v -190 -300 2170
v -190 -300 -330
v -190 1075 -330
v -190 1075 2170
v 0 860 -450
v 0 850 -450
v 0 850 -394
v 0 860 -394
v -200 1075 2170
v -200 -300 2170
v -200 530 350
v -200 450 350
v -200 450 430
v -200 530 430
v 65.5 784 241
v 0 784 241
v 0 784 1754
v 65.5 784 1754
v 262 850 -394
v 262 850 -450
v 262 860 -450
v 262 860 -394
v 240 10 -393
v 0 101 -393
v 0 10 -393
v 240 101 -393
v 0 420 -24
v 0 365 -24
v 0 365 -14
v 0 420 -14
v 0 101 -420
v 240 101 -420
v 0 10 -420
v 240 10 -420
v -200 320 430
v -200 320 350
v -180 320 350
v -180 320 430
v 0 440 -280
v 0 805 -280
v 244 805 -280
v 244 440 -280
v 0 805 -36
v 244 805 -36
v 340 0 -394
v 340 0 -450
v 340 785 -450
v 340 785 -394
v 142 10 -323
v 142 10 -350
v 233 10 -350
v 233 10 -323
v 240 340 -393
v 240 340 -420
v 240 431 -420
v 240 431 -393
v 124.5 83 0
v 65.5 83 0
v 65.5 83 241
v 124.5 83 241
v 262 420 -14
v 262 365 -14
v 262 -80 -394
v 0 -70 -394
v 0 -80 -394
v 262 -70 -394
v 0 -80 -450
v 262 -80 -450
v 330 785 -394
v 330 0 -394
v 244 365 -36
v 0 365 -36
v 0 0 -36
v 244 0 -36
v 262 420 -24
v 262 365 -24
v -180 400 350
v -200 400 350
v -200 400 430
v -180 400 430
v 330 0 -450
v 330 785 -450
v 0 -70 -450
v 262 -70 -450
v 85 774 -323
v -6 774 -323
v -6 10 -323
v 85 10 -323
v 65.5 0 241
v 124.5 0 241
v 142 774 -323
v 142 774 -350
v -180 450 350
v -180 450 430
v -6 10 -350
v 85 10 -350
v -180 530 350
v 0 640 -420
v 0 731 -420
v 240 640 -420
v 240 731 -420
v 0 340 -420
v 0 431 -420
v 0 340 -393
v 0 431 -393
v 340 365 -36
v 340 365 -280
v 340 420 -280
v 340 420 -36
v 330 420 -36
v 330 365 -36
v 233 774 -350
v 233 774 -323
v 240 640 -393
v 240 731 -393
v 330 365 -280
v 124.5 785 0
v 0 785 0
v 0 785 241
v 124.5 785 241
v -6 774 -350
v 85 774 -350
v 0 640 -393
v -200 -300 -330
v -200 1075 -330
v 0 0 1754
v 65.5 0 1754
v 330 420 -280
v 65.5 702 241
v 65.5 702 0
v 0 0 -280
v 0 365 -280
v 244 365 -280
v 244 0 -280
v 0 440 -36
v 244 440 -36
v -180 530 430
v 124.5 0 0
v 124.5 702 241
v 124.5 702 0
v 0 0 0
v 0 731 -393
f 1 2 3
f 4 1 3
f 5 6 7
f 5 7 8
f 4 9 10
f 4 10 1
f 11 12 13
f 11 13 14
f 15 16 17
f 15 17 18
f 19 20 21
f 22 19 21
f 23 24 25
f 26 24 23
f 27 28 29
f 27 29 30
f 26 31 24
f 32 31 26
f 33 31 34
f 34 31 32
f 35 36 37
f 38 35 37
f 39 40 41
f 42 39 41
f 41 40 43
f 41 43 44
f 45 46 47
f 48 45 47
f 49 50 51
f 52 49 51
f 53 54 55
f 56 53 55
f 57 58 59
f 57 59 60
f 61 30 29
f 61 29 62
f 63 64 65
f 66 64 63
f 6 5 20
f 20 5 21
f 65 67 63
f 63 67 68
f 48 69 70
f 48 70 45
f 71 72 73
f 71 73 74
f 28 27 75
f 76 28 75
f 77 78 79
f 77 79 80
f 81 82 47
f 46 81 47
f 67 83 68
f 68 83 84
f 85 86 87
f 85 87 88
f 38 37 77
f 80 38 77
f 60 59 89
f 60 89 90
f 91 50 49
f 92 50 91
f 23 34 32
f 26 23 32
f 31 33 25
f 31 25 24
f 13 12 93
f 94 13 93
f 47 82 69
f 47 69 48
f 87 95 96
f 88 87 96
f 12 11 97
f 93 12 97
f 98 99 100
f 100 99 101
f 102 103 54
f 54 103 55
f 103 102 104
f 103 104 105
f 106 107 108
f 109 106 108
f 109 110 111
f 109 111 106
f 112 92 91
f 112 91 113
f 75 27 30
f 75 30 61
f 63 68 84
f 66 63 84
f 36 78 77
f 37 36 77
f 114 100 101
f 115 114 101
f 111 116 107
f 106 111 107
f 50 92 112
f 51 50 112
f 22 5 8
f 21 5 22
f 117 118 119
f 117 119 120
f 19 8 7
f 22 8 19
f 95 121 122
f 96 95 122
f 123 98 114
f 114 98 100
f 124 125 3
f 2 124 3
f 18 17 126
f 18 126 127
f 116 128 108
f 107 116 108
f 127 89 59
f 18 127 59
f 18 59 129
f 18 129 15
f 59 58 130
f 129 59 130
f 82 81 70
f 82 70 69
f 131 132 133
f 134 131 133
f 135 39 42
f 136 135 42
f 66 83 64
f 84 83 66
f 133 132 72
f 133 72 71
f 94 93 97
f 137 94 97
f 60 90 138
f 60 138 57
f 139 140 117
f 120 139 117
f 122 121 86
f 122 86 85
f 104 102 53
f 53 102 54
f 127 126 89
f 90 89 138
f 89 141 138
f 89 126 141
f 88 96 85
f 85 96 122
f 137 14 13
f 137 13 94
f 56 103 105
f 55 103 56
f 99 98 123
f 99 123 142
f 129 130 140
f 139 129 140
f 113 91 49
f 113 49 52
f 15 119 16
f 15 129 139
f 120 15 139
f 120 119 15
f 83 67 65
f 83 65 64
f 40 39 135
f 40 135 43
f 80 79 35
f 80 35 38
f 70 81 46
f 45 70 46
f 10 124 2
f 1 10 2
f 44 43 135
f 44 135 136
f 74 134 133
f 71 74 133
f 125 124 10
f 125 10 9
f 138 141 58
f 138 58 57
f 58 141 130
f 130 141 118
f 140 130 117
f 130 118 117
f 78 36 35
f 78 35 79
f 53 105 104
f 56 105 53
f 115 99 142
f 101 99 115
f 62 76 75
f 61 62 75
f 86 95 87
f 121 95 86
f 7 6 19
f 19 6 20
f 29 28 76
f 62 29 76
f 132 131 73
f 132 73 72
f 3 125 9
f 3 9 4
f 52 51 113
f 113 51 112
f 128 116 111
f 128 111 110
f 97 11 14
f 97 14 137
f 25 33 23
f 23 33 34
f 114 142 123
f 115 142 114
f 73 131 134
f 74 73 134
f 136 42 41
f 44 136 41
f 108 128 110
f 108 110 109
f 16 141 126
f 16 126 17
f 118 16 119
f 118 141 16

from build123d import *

# Parameters (mm, degrees)
BOX002_W     = 124.5
BOX002_H     = 83
BOX002_DEPTH = 241
BOX_W        = 124.5
BOX_H        = 83
BOX_DEPTH    = 241
BOX003_W     = 65.5
BOX003_H     = 619
BOX003_DEPTH = 241
BOX001_W     = 65.5
BOX001_H     = 784
BOX001_DEPTH = 1513
BOX004_W     = 91
BOX004_H     = 764
BOX004_DEPTH = 27
BOX005_W     = 91
BOX005_H     = 764
BOX005_DEPTH = 27
BOX006_W     = 244
BOX006_H     = 365
BOX006_DEPTH = 244
BOX007_W     = 240
BOX007_H     = 91
BOX007_DEPTH = 27
BOX008_W     = 240
BOX008_H     = 91
BOX008_DEPTH = 27
BOX009_W     = 240
BOX009_H     = 91
BOX009_DEPTH = 27
BOX010_W     = 244
BOX010_H     = 365
BOX010_DEPTH = 244
BOX011_W     = 10
BOX011_H     = 1375
BOX011_DEPTH = 2500
BOX012_W     = 20
BOX012_H     = 80
BOX012_DEPTH = 80
BOX013_W     = 20
BOX013_H     = 80
BOX013_DEPTH = 80
BOX014_W     = 262
BOX014_H     = 10
BOX014_DEPTH = 56
BOX015_W     = 262
BOX015_H     = 10
BOX015_DEPTH = 56
BOX016_W     = 10
BOX016_H     = 785
BOX016_DEPTH = 56
BOX018_W     = 10
BOX018_H     = 55
BOX018_DEPTH = 244
BOX019_W     = 262
BOX019_H     = 55
BOX019_DEPTH = 10


with BuildPart() as sockelrechts:
    # Box002 → Box002 (new body)
    with BuildSketch(Plane(origin=(0, 702, 0), x_dir=(1, 0, 0), z_dir=(0, 0, 1))):
        with Locations((62.25, 41.5)):
            Rectangle(BOX002_W, BOX002_H)
    extrude(amount=BOX002_DEPTH)


with BuildPart() as sockellinks:
    # Box → Box (new body)
    with BuildSketch(Plane.XY):
        with Locations((62.25, 41.5)):
            Rectangle(BOX_W, BOX_H)
    extrude(amount=BOX_DEPTH)


with BuildPart() as spiegelflaechezwischensockel:
    # Box003 → Box003 (new body)
    with BuildSketch(Plane(origin=(0, 83, 0), x_dir=(1, 0, 0), z_dir=(0, 0, 1))):
        with Locations((32.75, 309.5)):
            Rectangle(BOX003_W, BOX003_H)
    extrude(amount=BOX003_DEPTH)


with BuildPart() as spiegelbody:
    # Box001 → Box001 (new body)
    with BuildSketch(Plane.XY.offset(241)):
        with Locations((32.75, 392)):
            Rectangle(BOX001_W, BOX001_H)
    extrude(amount=BOX001_DEPTH)

    # Connect: union SpiegelFlaecheZwischenSockel
    add(spiegelflaechezwischensockel.part)

    # Connect001: union SockelRechts, SockelLinks
    add(sockelrechts.part)
    add(sockellinks.part)


with BuildPart() as bodenkonstrleiste1:
    # Box004 → Box004 (new body)
    with BuildSketch(Plane(origin=(142, 10, -350), x_dir=(1, 0, 0), z_dir=(0, 0, 1))):
        with Locations((45.5, 382)):
            Rectangle(BOX004_W, BOX004_H)
    extrude(amount=BOX004_DEPTH)


with BuildPart() as bodenkonstrleiste002:
    # Box005 → Box005 (new body)
    with BuildSketch(Plane(origin=(-6, 10, -350), x_dir=(1, 0, 0), z_dir=(0, 0, 1))):
        with Locations((45.5, 382)):
            Rectangle(BOX005_W, BOX005_H)
    extrude(amount=BOX005_DEPTH)


with BuildPart() as ohp_left:
    # Box006 → Box006 (new body)
    with BuildSketch(Plane.XY.offset(-280)):
        with Locations((122, 182.5)):
            Rectangle(BOX006_W, BOX006_H)
    extrude(amount=BOX006_DEPTH)


with BuildPart() as box007:
    # Box007 → Box007 (new body)
    with BuildSketch(Plane(origin=(0, 10, -420), x_dir=(1, 0, 0), z_dir=(0, 0, 1))):
        with Locations((120, 45.5)):
            Rectangle(BOX007_W, BOX007_H)
    extrude(amount=BOX007_DEPTH)


with BuildPart() as box008:
    # Box008 → Box008 (new body)
    with BuildSketch(Plane(origin=(0, 340, -420), x_dir=(1, 0, 0), z_dir=(0, 0, 1))):
        with Locations((120, 45.5)):
            Rectangle(BOX008_W, BOX008_H)
    extrude(amount=BOX008_DEPTH)


with BuildPart() as box009:
    # Box009 → Box009 (new body)
    with BuildSketch(Plane(origin=(0, 640, -420), x_dir=(1, 0, 0), z_dir=(0, 0, 1))):
        with Locations((120, 45.5)):
            Rectangle(BOX009_W, BOX009_H)
    extrude(amount=BOX009_DEPTH)


with BuildPart() as ohp_right:
    # Box010 → Box010 (new body)
    with BuildSketch(Plane(origin=(0, 440, -280), x_dir=(1, 0, 0), z_dir=(0, 0, 1))):
        with Locations((122, 182.5)):
            Rectangle(BOX010_W, BOX010_H)
    extrude(amount=BOX010_DEPTH)


with BuildPart() as wand:
    # Box011 → Box011 (new body)
    with BuildSketch(Plane(origin=(-200, -300, -330), x_dir=(1, 0, 0), z_dir=(0, 0, 1))):
        with Locations((5, 687.5)):
            Rectangle(BOX011_W, BOX011_H)
    extrude(amount=BOX011_DEPTH)


with BuildPart() as steckdose1:
    # Box012 → Box012 (new body)
    with BuildSketch(Plane(origin=(-200, 320, 350), x_dir=(1, 0, 0), z_dir=(0, 0, 1))):
        with Locations((10, 40)):
            Rectangle(BOX012_W, BOX012_H)
    extrude(amount=BOX012_DEPTH)


with BuildPart() as steckdose2:
    # Box013 → Box013 (new body)
    with BuildSketch(Plane(origin=(-200, 450, 350), x_dir=(1, 0, 0), z_dir=(0, 0, 1))):
        with Locations((10, 40)):
            Rectangle(BOX013_W, BOX013_H)
    extrude(amount=BOX013_DEPTH)


with BuildPart() as bodenleistelinks:
    # Box014 → Box014 (new body)
    with BuildSketch(Plane(origin=(0, -80, -450), x_dir=(1, 0, 0), z_dir=(0, 0, 1))):
        with Locations((131, 5)):
            Rectangle(BOX014_W, BOX014_H)
    extrude(amount=BOX014_DEPTH)


with BuildPart() as bodenleisterechts:
    # Box015 → Box015 (new body)
    with BuildSketch(Plane(origin=(0, 850, -450), x_dir=(1, 0, 0), z_dir=(0, 0, 1))):
        with Locations((131, 5)):
            Rectangle(BOX015_W, BOX015_H)
    extrude(amount=BOX015_DEPTH)


with BuildPart() as bodenleistefront:
    # Box016 → Box016 (new body)
    with BuildSketch(Plane(origin=(330, 0, -450), x_dir=(1, 0, 0), z_dir=(0, 0, 1))):
        with Locations((5, 392.5)):
            Rectangle(BOX016_W, BOX016_H)
    extrude(amount=BOX016_DEPTH)


with BuildPart() as mittelleistefron:
    # Box018 → Box018 (new body)
    with BuildSketch(Plane(origin=(330, 365, -280), x_dir=(1, 0, 0), z_dir=(0, 0, 1))):
        with Locations((5, 27.5)):
            Rectangle(BOX018_W, BOX018_H)
    extrude(amount=BOX018_DEPTH)


with BuildPart() as mittelleisteoben:
    # Box019 → Box019 (new body)
    with BuildSketch(Plane(origin=(0, 365, -24), x_dir=(1, 0, 0), z_dir=(0, 0, 1))):
        with Locations((131, 27.5)):
            Rectangle(BOX019_W, BOX019_H)
    extrude(amount=BOX019_DEPTH)


solid = Compound([spiegelbody.part, bodenkonstrleiste1.part, bodenkonstrleiste002.part, ohp_left.part, box007.part, box008.part, box009.part, ohp_right.part, wand.part, steckdose1.part, steckdose2.part, bodenleistelinks.part, bodenleisterechts.part, bodenleistefront.part, mittelleistefron.part, mittelleisteoben.part])
